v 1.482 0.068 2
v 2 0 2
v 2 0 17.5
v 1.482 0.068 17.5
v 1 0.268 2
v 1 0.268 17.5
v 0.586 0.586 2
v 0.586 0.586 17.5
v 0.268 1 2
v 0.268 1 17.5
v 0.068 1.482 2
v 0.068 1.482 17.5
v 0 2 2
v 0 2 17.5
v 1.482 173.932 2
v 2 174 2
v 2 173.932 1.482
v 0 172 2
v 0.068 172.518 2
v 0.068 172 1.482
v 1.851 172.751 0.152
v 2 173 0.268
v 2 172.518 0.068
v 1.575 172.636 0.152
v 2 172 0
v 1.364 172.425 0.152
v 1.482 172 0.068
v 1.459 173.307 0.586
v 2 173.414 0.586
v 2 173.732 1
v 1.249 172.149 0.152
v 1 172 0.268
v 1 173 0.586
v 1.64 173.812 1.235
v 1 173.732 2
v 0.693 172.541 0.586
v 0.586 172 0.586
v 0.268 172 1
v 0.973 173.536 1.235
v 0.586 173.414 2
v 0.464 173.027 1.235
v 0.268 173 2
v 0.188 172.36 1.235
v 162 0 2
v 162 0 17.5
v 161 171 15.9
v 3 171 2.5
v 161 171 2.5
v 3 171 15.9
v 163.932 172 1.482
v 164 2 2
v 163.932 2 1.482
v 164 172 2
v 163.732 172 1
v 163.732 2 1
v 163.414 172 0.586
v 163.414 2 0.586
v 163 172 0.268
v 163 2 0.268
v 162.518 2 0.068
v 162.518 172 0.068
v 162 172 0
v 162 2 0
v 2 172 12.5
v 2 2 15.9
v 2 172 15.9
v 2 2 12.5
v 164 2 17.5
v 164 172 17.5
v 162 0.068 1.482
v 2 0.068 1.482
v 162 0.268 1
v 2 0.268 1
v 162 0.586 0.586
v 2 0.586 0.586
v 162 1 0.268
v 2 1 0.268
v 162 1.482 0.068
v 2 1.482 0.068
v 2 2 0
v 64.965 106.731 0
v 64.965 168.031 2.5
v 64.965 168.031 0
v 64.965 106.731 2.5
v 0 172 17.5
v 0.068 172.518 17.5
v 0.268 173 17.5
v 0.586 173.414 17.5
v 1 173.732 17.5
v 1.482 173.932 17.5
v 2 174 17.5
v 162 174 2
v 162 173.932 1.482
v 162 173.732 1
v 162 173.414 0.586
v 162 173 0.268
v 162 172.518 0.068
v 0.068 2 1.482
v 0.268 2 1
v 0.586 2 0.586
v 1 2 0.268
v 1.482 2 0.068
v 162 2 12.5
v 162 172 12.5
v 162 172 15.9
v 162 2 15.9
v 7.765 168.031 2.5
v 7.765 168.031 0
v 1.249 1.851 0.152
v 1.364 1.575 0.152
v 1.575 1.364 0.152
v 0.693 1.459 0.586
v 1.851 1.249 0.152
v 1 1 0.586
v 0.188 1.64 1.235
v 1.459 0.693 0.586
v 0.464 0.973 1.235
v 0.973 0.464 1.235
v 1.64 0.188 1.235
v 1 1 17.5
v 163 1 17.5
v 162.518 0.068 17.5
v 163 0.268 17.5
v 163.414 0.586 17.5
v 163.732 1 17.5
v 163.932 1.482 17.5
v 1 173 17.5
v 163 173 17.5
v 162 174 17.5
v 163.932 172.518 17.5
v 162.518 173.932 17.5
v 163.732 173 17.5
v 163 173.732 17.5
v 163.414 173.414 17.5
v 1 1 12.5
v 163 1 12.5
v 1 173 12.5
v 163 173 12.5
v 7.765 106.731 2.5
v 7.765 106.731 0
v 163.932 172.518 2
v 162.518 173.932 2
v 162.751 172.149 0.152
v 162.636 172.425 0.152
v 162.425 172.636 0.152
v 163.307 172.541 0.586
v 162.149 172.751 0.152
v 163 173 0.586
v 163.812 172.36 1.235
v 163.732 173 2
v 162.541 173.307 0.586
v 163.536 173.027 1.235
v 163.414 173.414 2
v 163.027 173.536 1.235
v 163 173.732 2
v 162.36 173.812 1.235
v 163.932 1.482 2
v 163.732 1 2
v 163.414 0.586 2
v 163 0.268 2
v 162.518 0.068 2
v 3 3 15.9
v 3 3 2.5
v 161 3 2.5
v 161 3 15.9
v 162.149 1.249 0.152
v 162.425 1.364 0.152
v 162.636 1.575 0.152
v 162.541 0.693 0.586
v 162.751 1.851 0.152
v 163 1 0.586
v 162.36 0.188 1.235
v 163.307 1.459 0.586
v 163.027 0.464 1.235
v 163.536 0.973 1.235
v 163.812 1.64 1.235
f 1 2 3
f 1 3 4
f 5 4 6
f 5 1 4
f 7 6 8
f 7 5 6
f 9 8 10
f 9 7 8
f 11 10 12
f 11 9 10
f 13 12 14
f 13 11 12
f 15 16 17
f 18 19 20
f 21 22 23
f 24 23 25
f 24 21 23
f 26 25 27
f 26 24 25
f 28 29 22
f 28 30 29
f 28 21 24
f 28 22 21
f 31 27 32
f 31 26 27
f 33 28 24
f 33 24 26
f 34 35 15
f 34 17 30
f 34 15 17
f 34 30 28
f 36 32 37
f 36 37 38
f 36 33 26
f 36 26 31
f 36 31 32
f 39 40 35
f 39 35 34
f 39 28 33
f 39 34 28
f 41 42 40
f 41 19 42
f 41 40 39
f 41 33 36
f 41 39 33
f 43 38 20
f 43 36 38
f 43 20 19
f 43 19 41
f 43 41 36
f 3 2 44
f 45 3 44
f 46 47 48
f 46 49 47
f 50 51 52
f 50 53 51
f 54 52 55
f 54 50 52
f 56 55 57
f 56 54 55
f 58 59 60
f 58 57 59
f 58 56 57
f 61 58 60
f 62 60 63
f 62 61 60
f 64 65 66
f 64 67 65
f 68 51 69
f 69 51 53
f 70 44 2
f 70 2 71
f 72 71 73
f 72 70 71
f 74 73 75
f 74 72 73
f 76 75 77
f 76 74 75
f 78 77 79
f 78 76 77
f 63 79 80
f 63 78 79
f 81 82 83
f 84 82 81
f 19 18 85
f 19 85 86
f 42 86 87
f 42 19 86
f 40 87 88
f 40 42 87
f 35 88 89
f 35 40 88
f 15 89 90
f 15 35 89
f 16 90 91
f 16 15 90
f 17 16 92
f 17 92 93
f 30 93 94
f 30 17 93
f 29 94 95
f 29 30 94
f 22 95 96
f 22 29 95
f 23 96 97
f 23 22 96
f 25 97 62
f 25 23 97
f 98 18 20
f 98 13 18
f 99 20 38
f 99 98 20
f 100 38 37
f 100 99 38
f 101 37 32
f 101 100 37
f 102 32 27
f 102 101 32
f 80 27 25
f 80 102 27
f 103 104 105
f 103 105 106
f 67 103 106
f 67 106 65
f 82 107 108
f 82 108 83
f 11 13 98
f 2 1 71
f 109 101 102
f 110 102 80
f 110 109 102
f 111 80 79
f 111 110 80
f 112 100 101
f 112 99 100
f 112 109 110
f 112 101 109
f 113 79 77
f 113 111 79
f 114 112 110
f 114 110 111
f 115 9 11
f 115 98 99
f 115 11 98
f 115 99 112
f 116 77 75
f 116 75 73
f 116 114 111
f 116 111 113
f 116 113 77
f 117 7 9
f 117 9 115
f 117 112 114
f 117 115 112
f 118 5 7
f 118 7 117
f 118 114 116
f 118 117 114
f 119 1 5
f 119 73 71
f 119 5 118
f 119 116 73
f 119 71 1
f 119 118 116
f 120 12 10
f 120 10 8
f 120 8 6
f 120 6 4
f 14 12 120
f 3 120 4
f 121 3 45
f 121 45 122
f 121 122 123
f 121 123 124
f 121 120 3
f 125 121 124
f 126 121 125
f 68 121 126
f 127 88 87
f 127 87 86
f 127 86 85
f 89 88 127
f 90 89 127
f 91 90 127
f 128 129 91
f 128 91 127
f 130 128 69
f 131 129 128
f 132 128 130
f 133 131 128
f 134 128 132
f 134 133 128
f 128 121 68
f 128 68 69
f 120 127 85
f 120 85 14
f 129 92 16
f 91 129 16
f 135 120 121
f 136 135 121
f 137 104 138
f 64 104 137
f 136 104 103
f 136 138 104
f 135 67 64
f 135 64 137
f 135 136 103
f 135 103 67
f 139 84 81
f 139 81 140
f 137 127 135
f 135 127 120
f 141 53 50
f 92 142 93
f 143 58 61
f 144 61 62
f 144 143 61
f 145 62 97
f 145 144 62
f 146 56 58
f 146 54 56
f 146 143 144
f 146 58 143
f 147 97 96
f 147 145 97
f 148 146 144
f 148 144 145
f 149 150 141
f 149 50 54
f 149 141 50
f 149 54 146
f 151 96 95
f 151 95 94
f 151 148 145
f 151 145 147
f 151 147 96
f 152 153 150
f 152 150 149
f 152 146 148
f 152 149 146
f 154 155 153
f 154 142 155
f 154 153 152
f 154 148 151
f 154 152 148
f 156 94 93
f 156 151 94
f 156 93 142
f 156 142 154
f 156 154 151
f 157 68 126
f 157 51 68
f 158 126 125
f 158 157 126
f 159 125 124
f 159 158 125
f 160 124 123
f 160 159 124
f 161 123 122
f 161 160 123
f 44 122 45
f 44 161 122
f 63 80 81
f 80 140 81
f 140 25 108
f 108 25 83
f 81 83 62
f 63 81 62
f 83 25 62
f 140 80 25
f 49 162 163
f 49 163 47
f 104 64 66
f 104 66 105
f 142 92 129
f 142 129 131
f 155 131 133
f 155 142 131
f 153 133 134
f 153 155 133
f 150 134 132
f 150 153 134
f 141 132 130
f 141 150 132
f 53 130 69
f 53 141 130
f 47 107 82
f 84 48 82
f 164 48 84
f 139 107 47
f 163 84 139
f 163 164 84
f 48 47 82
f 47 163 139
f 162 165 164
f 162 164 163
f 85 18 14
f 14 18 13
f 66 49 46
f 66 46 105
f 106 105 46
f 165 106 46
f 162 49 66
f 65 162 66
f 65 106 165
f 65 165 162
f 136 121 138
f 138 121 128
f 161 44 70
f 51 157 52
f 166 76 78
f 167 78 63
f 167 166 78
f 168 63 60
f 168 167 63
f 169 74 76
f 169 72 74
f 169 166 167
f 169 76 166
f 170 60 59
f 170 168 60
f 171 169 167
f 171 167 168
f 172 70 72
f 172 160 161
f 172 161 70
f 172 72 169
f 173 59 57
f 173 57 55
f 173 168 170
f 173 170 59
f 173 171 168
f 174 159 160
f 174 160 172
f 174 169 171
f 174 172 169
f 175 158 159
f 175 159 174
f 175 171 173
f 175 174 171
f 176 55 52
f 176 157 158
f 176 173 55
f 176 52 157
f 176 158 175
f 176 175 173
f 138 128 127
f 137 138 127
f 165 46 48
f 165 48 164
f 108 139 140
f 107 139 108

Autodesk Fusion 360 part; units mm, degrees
sketch "Sketch1" plane through (0, 0, 0) normal (0, 0, 1) x (1, 0, 0)
  line L0 (2, 0) -> (162, 0)
  line L1 (164, 2) -> (164, 172)
  line L2 (162, 174) -> (2, 174)
  line L3 (0, 172) -> (0, 2)
  arc A0 (2, 174) -> (0, 172) centre (2, 172) ccw
  arc A1 (164, 172) -> (162, 174) centre (162, 172) ccw
  arc A2 (0, 2) -> (2, 0) centre (2, 2) ccw
  arc A3 (162, 0) -> (164, 2) centre (162, 2) ccw
  point P0 (164, 0)
  point P1 (0, 174)
  dimension "d1" = 164
  dimension "d2" = 174
  dimension "d3" = 2
  dimension "d4" = 2
  dimension "d5" = 2
  dimension "d6" = 2
extrude "Extrude1" add sketch "Sketch1" along normal blind 17.5
sketch "Sketch2" plane through (0, 0, 17.5) normal (0, 0, 1) x (-1, 0, 0)
  arc A0 (-162, 0) -> (-164, -2) centre (-162, -2) ccw
  line L0 (-164, -2) -> (-164, -172)
  arc A1 (-164, -172) -> (-162, -174) centre (-162, -172) ccw
  line L1 (-162, -174) -> (-2, -174)
  arc A2 (-2, -174) -> (0, -172) centre (-2, -172) ccw
  line L2 (0, -172) -> (0, -2)
  arc A3 (0, -2) -> (-2, 0) centre (-2, -2) ccw
  line L3 (-2, 0) -> (-162, 0)
  line L4 (-1, -1) -> (-163, -1)
  line L5 (-163, -1) -> (-163, -173)
  line L6 (-163, -173) -> (-1, -173)
  line L7 (-1, -173) -> (-1, -1)
  dimension "d9" = 162
  dimension "d10" = 172
  dimension "d11" = 1
  dimension "d12" = 1
extrude "Extrude2" cut sketch "Sketch2" against normal blind 5 contours L4 L5 L6 L7
sketch "Sketch3" plane through (0, 0, 12.5) normal (0, 0, 1) x (-1, 0, 0)
  line L0 (-1, -173) -> (-1, -1)
  line L1 (-1, -1) -> (-163, -1)
  line L2 (-163, -1) -> (-163, -173)
  line L3 (-163, -173) -> (-1, -173)
  line L4 (-2, -172) -> (-162, -172)
  line L5 (-162, -172) -> (-162, -2)
  line L6 (-162, -2) -> (-2, -2)
  line L7 (-2, -2) -> (-2, -172)
  dimension "d15" = 160
  dimension "d16" = 170
  dimension "d17" = 1
  dimension "d18" = 1
extrude "Extrude3" add sketch "Sketch3" along normal blind 3.4 contours L4 L5 L6 L7
sketch "Sketch5" plane through (0, 0, 15.9) normal (0, 0, 1) x (-1, 0, 0)
  line L0 (-2, -2) -> (-162, -2)
  line L1 (-162, -2) -> (-162, -172)
  line L2 (-162, -172) -> (-2, -172)
  line L3 (-2, -172) -> (-2, -2)
  line L4 (-3, -171) -> (-161, -171)
  line L5 (-161, -171) -> (-161, -3)
  line L6 (-161, -3) -> (-3, -3)
  line L7 (-3, -3) -> (-3, -171)
  dimension "d27" = 158
  dimension "d28" = 168
  dimension "d29" = 1
  dimension "d30" = 1
extrude "Extrude5" cut sketch "Sketch5" against normal blind 13.4 contours L4 L5 L6 L7
sketch "Sketch6" plane through (0, 0, 2.5) normal (0, 0, 1) x (-1, 0, 0)
  line L0 (-3, -3) -> (-161, -3)
  line L1 (-161, -3) -> (-161, -171)
  line L2 (-161, -171) -> (-3, -171)
  line L3 (-3, -171) -> (-3, -3)
  line L4 (-7.765, -168.031) -> (-64.965, -168.031)
  line L5 (-64.965, -168.031) -> (-64.965, -106.731)
  line L6 (-64.965, -106.731) -> (-7.765, -106.731)
  line L7 (-7.765, -106.731) -> (-7.765, -168.031)
  line L8 (0, -172) -> (0, -2)
  line L9 (-162, -174) -> (-2, -174)
  dimension "d33" = 57.2
  dimension "d34" = 61.3
  dimension "d35" = 7.765
  dimension "d36" = 5.969
extrude "Extrude6" cut sketch "Sketch6" against normal blind 2.5 contours L4 L5 L6 L7
fillet "Fillet1" radius 2 8 edges at (163.4142, 173.4142, 0) (82, 174, 0) (0.5858, 173.4142, 0) (0, 87, 0) (0.5858, 0.5858, 0) (82, 0, 0) (163.4142, 0.5858, 0) (164, 87, 0)
